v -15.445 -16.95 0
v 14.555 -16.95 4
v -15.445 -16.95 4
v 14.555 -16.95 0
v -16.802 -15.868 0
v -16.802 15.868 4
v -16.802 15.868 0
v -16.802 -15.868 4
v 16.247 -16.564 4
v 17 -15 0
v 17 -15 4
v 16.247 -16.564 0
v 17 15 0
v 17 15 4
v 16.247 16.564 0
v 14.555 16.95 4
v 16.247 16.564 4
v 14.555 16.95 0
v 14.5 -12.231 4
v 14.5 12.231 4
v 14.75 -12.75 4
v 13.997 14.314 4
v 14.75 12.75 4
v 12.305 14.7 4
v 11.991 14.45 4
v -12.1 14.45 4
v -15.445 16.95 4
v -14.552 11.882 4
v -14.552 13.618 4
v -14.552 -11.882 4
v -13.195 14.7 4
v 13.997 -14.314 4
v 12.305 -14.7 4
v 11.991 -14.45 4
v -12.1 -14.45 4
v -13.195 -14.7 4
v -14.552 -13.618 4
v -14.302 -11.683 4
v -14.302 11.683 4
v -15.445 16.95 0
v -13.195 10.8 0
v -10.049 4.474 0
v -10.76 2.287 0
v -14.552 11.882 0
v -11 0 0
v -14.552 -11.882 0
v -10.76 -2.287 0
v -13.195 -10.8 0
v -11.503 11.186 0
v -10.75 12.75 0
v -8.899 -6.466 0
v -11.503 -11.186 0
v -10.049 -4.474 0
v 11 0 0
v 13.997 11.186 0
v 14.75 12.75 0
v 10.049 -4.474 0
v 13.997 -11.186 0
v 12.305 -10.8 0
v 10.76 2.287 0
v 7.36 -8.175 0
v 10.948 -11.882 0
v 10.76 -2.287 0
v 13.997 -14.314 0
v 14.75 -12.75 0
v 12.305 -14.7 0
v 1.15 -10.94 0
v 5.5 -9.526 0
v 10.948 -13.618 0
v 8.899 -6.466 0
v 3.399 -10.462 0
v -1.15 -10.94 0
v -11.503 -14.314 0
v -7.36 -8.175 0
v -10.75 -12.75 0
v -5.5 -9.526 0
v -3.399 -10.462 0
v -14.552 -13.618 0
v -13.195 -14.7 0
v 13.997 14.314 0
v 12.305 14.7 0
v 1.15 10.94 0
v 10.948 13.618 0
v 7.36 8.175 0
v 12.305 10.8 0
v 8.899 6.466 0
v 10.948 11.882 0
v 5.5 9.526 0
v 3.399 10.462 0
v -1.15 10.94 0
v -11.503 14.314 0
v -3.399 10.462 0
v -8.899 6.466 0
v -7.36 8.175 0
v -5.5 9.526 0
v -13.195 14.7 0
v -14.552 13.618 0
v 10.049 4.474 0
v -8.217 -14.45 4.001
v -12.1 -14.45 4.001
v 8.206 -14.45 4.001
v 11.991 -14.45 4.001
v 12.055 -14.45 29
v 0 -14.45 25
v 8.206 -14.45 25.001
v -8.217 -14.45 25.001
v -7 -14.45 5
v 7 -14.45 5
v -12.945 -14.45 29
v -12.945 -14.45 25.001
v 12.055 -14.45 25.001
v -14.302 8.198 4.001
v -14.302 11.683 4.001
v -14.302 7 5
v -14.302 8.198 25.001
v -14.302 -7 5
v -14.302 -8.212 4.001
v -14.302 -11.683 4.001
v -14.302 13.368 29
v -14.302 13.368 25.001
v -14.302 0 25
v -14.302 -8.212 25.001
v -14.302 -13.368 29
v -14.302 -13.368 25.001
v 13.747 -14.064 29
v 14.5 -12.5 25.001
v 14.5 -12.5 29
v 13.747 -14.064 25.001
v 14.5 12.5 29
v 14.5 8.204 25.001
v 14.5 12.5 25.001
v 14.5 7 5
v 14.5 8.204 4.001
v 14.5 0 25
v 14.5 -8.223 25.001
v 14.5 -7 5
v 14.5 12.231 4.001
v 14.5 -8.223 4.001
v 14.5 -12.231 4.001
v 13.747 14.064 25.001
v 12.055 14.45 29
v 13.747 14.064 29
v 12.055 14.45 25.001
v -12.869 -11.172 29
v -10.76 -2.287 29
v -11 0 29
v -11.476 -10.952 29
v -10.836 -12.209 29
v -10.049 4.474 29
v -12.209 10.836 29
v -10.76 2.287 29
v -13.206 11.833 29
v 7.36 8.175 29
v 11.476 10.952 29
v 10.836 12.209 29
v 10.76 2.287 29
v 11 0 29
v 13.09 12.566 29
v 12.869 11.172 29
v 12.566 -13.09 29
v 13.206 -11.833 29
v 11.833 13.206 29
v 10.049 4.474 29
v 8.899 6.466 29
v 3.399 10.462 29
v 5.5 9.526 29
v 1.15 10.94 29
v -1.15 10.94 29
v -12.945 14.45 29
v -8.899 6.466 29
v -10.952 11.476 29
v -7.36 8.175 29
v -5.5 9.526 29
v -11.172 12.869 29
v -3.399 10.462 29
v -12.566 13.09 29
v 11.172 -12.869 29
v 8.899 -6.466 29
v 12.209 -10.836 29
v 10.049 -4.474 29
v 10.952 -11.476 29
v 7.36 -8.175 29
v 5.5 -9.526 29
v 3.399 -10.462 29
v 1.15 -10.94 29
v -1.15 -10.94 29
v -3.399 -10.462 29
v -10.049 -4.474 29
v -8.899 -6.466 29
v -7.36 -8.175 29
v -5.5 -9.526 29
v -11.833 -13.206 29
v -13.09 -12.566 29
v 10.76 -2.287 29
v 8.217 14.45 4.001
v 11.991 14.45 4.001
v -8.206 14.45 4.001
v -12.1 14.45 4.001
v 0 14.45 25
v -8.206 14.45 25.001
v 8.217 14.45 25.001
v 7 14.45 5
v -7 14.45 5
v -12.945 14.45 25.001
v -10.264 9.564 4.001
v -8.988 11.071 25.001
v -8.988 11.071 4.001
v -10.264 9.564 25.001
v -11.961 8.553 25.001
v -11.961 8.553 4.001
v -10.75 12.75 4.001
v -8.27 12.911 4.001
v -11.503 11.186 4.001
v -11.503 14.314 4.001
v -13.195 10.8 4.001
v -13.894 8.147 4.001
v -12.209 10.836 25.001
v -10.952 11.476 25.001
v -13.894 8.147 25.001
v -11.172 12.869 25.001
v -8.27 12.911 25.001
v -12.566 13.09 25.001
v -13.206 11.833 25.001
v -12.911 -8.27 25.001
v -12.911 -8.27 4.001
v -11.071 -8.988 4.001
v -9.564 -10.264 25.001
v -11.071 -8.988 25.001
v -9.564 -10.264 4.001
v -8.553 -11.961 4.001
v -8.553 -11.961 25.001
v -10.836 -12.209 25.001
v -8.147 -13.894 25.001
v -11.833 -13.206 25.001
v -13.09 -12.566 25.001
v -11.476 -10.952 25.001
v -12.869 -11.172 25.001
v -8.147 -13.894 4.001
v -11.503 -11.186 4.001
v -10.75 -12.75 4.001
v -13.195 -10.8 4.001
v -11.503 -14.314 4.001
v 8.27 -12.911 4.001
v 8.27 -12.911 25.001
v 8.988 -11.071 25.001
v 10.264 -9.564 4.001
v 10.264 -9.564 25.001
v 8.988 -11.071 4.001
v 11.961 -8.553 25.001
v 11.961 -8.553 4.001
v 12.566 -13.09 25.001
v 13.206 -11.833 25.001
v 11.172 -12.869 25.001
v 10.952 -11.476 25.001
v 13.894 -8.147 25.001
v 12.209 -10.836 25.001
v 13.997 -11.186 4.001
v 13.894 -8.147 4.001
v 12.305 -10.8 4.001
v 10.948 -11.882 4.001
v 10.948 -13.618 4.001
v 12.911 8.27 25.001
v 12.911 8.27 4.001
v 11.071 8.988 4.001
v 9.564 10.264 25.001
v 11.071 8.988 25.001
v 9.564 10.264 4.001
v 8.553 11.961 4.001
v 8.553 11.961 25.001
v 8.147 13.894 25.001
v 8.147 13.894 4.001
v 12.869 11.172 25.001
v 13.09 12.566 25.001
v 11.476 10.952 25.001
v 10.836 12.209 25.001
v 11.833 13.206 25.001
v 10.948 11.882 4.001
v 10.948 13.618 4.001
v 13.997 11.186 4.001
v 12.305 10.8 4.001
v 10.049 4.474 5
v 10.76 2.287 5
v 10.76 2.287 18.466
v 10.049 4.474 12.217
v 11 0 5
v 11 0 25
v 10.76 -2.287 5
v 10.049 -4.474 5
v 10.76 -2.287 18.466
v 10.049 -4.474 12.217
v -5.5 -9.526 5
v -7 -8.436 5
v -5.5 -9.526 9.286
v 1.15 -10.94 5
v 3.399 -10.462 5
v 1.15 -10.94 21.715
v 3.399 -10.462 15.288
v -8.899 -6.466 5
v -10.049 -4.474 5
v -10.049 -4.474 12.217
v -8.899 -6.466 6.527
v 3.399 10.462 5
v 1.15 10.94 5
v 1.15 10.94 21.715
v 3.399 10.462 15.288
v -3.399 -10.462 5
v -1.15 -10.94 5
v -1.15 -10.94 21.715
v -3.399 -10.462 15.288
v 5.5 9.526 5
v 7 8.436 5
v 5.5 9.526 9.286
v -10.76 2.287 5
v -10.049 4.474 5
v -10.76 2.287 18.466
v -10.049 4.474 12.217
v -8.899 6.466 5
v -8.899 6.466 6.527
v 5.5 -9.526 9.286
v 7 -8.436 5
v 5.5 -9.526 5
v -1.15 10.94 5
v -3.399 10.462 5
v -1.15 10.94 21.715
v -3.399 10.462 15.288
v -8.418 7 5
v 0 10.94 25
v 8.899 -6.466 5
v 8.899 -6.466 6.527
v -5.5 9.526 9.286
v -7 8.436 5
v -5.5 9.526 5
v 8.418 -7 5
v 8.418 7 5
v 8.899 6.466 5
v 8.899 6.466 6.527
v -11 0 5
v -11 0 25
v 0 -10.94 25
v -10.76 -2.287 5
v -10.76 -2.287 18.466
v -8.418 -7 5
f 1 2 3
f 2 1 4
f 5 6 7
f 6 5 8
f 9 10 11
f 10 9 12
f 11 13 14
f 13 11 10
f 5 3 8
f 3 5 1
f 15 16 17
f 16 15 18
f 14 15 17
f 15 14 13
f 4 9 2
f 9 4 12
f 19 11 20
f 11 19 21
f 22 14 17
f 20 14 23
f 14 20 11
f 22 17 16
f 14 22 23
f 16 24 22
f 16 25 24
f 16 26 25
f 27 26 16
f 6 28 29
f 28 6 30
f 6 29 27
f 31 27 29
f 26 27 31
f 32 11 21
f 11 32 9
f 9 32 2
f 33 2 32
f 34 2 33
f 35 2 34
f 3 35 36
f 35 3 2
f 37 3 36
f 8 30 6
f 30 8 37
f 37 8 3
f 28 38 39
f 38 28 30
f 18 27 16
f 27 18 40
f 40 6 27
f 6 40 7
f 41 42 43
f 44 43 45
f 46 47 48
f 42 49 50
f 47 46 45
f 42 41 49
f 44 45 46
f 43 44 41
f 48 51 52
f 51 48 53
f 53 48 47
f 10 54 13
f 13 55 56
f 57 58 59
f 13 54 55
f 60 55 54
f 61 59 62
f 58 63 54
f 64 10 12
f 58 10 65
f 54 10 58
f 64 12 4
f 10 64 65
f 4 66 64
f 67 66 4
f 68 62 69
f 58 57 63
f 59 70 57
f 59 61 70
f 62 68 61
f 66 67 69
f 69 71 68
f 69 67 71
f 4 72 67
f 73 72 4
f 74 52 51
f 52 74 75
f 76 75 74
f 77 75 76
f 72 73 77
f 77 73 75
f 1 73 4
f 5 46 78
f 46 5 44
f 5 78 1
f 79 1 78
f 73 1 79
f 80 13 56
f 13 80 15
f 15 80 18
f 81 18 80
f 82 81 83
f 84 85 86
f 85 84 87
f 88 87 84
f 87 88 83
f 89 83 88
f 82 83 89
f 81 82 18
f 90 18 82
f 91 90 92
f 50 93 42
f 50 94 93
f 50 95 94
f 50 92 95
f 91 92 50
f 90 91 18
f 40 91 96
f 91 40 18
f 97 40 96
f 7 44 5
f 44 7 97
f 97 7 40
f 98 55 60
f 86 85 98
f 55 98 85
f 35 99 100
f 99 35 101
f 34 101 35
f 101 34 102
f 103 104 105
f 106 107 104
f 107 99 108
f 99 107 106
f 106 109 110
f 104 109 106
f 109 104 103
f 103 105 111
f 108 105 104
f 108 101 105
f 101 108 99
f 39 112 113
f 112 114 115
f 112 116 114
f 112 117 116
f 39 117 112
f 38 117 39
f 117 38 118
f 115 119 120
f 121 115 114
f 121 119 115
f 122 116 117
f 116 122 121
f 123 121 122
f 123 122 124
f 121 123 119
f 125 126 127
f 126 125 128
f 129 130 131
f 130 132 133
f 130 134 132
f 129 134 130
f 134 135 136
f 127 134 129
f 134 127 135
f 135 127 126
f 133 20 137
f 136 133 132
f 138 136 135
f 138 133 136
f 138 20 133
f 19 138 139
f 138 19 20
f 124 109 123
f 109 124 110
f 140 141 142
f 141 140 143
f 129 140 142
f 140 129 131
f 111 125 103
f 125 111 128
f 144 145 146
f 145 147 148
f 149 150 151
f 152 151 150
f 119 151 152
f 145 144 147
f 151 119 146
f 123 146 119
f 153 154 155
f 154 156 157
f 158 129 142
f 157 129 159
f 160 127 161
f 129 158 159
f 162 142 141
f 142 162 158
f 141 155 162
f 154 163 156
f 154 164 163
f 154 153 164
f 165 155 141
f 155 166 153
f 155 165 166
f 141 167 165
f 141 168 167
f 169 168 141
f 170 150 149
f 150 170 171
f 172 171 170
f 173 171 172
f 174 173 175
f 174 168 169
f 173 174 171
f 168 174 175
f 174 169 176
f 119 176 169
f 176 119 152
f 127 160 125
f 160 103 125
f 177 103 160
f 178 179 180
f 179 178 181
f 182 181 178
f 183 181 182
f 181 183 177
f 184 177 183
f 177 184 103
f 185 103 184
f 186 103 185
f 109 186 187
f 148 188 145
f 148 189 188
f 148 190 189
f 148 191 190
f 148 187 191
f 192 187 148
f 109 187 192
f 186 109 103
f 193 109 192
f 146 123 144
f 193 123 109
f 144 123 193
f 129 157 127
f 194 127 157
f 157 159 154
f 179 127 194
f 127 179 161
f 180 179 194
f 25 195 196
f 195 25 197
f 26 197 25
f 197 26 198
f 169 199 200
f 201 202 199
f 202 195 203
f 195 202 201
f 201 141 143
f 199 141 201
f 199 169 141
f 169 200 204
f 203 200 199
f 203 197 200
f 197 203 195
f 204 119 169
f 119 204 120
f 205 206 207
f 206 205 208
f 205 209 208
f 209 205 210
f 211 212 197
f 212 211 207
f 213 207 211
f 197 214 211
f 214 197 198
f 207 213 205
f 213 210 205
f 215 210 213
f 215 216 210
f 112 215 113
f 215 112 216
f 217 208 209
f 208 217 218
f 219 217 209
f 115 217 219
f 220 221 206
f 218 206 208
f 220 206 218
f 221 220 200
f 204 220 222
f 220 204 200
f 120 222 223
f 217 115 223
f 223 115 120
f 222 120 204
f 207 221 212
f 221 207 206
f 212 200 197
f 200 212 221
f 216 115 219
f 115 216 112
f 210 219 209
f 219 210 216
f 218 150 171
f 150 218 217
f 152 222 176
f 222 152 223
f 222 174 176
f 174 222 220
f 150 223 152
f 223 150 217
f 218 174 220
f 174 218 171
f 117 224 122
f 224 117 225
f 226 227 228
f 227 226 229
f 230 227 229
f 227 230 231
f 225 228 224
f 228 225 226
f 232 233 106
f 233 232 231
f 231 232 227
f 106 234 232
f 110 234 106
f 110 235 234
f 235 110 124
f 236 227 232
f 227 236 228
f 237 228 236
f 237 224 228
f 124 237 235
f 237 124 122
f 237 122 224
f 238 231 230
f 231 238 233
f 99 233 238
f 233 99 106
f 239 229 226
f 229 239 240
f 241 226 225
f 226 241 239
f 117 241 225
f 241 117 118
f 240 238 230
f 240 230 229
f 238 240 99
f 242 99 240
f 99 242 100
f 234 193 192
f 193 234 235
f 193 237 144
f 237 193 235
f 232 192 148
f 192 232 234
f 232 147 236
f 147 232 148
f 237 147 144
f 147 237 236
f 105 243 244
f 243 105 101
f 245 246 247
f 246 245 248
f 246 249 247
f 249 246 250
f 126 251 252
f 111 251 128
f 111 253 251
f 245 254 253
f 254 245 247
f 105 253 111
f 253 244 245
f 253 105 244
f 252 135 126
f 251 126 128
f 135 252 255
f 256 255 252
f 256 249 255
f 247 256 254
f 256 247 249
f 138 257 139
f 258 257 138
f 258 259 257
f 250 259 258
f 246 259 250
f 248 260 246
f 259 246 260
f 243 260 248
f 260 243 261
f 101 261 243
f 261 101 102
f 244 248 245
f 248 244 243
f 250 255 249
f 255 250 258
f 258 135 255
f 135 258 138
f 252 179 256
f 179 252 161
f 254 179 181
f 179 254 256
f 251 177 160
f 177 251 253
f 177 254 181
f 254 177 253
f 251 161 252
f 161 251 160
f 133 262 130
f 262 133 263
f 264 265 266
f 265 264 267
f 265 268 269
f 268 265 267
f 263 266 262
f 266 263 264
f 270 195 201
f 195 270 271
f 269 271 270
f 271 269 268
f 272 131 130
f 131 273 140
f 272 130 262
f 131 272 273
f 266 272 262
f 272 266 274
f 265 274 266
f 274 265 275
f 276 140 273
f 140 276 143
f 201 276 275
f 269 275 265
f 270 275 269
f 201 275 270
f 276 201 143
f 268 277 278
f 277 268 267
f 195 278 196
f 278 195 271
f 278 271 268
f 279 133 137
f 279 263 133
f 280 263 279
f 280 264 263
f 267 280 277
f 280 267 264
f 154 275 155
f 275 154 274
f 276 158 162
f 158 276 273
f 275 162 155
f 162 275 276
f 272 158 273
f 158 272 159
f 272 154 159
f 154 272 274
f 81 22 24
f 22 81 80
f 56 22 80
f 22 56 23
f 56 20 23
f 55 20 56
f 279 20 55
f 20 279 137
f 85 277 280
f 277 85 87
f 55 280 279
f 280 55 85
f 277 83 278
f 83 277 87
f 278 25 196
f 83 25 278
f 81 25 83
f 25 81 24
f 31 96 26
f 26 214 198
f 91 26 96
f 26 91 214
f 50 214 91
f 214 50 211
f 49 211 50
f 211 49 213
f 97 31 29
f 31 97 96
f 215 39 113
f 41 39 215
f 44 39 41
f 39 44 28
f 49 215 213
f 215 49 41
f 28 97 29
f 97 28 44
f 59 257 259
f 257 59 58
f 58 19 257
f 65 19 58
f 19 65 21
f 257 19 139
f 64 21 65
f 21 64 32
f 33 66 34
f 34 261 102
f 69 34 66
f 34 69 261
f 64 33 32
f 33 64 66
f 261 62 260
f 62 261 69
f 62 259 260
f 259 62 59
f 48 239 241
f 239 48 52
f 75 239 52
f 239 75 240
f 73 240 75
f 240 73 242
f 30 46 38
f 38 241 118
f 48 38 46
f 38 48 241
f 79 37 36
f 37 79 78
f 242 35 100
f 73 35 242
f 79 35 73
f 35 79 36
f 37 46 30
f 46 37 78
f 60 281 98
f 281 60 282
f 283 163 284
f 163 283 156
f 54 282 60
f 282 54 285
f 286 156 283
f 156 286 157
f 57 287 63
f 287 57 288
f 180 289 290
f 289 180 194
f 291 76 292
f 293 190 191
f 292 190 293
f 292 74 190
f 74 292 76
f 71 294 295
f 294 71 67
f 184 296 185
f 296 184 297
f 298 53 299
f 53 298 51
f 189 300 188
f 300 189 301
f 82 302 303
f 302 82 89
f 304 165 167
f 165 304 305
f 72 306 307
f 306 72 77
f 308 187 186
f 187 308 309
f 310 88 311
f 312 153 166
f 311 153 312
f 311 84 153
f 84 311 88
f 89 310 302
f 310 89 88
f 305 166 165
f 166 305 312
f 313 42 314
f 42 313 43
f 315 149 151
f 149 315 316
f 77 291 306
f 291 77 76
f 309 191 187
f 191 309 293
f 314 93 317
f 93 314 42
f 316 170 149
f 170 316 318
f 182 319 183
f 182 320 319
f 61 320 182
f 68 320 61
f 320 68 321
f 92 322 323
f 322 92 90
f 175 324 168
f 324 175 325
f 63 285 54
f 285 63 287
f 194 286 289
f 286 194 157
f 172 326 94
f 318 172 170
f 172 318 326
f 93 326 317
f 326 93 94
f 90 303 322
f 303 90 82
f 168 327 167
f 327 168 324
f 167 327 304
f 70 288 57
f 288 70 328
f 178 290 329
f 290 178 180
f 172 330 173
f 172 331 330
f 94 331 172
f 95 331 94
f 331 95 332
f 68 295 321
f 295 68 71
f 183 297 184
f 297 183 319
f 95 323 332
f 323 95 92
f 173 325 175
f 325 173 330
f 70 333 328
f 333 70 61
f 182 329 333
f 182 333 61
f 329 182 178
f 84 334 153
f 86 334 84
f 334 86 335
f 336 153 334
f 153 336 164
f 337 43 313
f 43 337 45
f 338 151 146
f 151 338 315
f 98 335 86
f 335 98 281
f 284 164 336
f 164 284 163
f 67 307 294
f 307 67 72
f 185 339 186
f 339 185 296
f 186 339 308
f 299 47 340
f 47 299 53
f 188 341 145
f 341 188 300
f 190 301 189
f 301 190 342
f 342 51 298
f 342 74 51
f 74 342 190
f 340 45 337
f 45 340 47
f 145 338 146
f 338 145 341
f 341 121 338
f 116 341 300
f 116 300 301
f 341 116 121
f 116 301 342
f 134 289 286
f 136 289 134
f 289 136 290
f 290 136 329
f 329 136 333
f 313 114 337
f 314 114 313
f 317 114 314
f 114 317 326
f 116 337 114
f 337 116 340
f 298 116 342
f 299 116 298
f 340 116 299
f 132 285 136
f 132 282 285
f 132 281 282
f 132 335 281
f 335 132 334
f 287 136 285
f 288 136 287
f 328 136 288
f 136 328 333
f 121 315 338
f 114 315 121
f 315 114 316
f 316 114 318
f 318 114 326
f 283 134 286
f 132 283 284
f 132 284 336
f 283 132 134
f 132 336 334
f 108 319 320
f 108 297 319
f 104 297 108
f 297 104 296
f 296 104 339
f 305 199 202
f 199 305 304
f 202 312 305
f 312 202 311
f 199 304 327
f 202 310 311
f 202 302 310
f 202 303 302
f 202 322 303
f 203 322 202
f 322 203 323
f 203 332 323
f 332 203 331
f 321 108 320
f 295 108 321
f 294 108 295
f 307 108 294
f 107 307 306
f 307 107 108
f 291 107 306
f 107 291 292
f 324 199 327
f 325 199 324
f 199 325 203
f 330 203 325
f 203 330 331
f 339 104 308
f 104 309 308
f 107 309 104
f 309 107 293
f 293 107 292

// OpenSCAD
module triangular_hole()
{
    linear_extrude(height = 40) polygon(points = [ [ 0, 0 ], [ 20, 7 ], [ 20, -7 ] ]);
}

module motor_magnet_link()
{

    difference()
    {
        union()
        {
            linear_extrude(height = 4) minkowski()
            {
                square(size = 30, center = true);
                circle(r = 2);
            }
            linear_extrude(height = 29) minkowski()
            {
                square(size = 25, center = true);
                circle(r = 2);
            }
        }

        for (i = [0:90:360])
        {
            rotate(i + 45) translate(v = [ 0, 20, 4.001 ]) cylinder(h = 21, r = 6);
            rotate(i + 45) translate(v = [ 0, 17, 20 ]) cylinder(h = 21, r = 1.2);
        }
        screw_offset = 25.5 / 2;

        translate(v = [ screw_offset, screw_offset, 0 ]) cylinder(h = 10, r = 2, center=true);
        translate(v = [ -screw_offset, screw_offset, 0 ]) cylinder(h = 10, r = 2, center=true);
        translate(v = [ screw_offset, -screw_offset, 0 ]) cylinder(h = 10, r = 2, center=true);
        translate(v = [ -screw_offset, -screw_offset, 0 ]) cylinder(h = 10, r = 2, center=true);

        cylinder(h = 100, r = 11, center = true);

        translate(v = [ -20, 0, 25 ]) rotate(a = 90, v = [ 0, 1, 0 ]) triangular_hole();
        rotate(a = 90, v = [ 0, 0, 1 ]) translate(v = [ -20, 0, 25 ]) rotate(a = 90, v = [ 0, 1, 0 ]) triangular_hole();

    }
}

motor_magnet_link();
